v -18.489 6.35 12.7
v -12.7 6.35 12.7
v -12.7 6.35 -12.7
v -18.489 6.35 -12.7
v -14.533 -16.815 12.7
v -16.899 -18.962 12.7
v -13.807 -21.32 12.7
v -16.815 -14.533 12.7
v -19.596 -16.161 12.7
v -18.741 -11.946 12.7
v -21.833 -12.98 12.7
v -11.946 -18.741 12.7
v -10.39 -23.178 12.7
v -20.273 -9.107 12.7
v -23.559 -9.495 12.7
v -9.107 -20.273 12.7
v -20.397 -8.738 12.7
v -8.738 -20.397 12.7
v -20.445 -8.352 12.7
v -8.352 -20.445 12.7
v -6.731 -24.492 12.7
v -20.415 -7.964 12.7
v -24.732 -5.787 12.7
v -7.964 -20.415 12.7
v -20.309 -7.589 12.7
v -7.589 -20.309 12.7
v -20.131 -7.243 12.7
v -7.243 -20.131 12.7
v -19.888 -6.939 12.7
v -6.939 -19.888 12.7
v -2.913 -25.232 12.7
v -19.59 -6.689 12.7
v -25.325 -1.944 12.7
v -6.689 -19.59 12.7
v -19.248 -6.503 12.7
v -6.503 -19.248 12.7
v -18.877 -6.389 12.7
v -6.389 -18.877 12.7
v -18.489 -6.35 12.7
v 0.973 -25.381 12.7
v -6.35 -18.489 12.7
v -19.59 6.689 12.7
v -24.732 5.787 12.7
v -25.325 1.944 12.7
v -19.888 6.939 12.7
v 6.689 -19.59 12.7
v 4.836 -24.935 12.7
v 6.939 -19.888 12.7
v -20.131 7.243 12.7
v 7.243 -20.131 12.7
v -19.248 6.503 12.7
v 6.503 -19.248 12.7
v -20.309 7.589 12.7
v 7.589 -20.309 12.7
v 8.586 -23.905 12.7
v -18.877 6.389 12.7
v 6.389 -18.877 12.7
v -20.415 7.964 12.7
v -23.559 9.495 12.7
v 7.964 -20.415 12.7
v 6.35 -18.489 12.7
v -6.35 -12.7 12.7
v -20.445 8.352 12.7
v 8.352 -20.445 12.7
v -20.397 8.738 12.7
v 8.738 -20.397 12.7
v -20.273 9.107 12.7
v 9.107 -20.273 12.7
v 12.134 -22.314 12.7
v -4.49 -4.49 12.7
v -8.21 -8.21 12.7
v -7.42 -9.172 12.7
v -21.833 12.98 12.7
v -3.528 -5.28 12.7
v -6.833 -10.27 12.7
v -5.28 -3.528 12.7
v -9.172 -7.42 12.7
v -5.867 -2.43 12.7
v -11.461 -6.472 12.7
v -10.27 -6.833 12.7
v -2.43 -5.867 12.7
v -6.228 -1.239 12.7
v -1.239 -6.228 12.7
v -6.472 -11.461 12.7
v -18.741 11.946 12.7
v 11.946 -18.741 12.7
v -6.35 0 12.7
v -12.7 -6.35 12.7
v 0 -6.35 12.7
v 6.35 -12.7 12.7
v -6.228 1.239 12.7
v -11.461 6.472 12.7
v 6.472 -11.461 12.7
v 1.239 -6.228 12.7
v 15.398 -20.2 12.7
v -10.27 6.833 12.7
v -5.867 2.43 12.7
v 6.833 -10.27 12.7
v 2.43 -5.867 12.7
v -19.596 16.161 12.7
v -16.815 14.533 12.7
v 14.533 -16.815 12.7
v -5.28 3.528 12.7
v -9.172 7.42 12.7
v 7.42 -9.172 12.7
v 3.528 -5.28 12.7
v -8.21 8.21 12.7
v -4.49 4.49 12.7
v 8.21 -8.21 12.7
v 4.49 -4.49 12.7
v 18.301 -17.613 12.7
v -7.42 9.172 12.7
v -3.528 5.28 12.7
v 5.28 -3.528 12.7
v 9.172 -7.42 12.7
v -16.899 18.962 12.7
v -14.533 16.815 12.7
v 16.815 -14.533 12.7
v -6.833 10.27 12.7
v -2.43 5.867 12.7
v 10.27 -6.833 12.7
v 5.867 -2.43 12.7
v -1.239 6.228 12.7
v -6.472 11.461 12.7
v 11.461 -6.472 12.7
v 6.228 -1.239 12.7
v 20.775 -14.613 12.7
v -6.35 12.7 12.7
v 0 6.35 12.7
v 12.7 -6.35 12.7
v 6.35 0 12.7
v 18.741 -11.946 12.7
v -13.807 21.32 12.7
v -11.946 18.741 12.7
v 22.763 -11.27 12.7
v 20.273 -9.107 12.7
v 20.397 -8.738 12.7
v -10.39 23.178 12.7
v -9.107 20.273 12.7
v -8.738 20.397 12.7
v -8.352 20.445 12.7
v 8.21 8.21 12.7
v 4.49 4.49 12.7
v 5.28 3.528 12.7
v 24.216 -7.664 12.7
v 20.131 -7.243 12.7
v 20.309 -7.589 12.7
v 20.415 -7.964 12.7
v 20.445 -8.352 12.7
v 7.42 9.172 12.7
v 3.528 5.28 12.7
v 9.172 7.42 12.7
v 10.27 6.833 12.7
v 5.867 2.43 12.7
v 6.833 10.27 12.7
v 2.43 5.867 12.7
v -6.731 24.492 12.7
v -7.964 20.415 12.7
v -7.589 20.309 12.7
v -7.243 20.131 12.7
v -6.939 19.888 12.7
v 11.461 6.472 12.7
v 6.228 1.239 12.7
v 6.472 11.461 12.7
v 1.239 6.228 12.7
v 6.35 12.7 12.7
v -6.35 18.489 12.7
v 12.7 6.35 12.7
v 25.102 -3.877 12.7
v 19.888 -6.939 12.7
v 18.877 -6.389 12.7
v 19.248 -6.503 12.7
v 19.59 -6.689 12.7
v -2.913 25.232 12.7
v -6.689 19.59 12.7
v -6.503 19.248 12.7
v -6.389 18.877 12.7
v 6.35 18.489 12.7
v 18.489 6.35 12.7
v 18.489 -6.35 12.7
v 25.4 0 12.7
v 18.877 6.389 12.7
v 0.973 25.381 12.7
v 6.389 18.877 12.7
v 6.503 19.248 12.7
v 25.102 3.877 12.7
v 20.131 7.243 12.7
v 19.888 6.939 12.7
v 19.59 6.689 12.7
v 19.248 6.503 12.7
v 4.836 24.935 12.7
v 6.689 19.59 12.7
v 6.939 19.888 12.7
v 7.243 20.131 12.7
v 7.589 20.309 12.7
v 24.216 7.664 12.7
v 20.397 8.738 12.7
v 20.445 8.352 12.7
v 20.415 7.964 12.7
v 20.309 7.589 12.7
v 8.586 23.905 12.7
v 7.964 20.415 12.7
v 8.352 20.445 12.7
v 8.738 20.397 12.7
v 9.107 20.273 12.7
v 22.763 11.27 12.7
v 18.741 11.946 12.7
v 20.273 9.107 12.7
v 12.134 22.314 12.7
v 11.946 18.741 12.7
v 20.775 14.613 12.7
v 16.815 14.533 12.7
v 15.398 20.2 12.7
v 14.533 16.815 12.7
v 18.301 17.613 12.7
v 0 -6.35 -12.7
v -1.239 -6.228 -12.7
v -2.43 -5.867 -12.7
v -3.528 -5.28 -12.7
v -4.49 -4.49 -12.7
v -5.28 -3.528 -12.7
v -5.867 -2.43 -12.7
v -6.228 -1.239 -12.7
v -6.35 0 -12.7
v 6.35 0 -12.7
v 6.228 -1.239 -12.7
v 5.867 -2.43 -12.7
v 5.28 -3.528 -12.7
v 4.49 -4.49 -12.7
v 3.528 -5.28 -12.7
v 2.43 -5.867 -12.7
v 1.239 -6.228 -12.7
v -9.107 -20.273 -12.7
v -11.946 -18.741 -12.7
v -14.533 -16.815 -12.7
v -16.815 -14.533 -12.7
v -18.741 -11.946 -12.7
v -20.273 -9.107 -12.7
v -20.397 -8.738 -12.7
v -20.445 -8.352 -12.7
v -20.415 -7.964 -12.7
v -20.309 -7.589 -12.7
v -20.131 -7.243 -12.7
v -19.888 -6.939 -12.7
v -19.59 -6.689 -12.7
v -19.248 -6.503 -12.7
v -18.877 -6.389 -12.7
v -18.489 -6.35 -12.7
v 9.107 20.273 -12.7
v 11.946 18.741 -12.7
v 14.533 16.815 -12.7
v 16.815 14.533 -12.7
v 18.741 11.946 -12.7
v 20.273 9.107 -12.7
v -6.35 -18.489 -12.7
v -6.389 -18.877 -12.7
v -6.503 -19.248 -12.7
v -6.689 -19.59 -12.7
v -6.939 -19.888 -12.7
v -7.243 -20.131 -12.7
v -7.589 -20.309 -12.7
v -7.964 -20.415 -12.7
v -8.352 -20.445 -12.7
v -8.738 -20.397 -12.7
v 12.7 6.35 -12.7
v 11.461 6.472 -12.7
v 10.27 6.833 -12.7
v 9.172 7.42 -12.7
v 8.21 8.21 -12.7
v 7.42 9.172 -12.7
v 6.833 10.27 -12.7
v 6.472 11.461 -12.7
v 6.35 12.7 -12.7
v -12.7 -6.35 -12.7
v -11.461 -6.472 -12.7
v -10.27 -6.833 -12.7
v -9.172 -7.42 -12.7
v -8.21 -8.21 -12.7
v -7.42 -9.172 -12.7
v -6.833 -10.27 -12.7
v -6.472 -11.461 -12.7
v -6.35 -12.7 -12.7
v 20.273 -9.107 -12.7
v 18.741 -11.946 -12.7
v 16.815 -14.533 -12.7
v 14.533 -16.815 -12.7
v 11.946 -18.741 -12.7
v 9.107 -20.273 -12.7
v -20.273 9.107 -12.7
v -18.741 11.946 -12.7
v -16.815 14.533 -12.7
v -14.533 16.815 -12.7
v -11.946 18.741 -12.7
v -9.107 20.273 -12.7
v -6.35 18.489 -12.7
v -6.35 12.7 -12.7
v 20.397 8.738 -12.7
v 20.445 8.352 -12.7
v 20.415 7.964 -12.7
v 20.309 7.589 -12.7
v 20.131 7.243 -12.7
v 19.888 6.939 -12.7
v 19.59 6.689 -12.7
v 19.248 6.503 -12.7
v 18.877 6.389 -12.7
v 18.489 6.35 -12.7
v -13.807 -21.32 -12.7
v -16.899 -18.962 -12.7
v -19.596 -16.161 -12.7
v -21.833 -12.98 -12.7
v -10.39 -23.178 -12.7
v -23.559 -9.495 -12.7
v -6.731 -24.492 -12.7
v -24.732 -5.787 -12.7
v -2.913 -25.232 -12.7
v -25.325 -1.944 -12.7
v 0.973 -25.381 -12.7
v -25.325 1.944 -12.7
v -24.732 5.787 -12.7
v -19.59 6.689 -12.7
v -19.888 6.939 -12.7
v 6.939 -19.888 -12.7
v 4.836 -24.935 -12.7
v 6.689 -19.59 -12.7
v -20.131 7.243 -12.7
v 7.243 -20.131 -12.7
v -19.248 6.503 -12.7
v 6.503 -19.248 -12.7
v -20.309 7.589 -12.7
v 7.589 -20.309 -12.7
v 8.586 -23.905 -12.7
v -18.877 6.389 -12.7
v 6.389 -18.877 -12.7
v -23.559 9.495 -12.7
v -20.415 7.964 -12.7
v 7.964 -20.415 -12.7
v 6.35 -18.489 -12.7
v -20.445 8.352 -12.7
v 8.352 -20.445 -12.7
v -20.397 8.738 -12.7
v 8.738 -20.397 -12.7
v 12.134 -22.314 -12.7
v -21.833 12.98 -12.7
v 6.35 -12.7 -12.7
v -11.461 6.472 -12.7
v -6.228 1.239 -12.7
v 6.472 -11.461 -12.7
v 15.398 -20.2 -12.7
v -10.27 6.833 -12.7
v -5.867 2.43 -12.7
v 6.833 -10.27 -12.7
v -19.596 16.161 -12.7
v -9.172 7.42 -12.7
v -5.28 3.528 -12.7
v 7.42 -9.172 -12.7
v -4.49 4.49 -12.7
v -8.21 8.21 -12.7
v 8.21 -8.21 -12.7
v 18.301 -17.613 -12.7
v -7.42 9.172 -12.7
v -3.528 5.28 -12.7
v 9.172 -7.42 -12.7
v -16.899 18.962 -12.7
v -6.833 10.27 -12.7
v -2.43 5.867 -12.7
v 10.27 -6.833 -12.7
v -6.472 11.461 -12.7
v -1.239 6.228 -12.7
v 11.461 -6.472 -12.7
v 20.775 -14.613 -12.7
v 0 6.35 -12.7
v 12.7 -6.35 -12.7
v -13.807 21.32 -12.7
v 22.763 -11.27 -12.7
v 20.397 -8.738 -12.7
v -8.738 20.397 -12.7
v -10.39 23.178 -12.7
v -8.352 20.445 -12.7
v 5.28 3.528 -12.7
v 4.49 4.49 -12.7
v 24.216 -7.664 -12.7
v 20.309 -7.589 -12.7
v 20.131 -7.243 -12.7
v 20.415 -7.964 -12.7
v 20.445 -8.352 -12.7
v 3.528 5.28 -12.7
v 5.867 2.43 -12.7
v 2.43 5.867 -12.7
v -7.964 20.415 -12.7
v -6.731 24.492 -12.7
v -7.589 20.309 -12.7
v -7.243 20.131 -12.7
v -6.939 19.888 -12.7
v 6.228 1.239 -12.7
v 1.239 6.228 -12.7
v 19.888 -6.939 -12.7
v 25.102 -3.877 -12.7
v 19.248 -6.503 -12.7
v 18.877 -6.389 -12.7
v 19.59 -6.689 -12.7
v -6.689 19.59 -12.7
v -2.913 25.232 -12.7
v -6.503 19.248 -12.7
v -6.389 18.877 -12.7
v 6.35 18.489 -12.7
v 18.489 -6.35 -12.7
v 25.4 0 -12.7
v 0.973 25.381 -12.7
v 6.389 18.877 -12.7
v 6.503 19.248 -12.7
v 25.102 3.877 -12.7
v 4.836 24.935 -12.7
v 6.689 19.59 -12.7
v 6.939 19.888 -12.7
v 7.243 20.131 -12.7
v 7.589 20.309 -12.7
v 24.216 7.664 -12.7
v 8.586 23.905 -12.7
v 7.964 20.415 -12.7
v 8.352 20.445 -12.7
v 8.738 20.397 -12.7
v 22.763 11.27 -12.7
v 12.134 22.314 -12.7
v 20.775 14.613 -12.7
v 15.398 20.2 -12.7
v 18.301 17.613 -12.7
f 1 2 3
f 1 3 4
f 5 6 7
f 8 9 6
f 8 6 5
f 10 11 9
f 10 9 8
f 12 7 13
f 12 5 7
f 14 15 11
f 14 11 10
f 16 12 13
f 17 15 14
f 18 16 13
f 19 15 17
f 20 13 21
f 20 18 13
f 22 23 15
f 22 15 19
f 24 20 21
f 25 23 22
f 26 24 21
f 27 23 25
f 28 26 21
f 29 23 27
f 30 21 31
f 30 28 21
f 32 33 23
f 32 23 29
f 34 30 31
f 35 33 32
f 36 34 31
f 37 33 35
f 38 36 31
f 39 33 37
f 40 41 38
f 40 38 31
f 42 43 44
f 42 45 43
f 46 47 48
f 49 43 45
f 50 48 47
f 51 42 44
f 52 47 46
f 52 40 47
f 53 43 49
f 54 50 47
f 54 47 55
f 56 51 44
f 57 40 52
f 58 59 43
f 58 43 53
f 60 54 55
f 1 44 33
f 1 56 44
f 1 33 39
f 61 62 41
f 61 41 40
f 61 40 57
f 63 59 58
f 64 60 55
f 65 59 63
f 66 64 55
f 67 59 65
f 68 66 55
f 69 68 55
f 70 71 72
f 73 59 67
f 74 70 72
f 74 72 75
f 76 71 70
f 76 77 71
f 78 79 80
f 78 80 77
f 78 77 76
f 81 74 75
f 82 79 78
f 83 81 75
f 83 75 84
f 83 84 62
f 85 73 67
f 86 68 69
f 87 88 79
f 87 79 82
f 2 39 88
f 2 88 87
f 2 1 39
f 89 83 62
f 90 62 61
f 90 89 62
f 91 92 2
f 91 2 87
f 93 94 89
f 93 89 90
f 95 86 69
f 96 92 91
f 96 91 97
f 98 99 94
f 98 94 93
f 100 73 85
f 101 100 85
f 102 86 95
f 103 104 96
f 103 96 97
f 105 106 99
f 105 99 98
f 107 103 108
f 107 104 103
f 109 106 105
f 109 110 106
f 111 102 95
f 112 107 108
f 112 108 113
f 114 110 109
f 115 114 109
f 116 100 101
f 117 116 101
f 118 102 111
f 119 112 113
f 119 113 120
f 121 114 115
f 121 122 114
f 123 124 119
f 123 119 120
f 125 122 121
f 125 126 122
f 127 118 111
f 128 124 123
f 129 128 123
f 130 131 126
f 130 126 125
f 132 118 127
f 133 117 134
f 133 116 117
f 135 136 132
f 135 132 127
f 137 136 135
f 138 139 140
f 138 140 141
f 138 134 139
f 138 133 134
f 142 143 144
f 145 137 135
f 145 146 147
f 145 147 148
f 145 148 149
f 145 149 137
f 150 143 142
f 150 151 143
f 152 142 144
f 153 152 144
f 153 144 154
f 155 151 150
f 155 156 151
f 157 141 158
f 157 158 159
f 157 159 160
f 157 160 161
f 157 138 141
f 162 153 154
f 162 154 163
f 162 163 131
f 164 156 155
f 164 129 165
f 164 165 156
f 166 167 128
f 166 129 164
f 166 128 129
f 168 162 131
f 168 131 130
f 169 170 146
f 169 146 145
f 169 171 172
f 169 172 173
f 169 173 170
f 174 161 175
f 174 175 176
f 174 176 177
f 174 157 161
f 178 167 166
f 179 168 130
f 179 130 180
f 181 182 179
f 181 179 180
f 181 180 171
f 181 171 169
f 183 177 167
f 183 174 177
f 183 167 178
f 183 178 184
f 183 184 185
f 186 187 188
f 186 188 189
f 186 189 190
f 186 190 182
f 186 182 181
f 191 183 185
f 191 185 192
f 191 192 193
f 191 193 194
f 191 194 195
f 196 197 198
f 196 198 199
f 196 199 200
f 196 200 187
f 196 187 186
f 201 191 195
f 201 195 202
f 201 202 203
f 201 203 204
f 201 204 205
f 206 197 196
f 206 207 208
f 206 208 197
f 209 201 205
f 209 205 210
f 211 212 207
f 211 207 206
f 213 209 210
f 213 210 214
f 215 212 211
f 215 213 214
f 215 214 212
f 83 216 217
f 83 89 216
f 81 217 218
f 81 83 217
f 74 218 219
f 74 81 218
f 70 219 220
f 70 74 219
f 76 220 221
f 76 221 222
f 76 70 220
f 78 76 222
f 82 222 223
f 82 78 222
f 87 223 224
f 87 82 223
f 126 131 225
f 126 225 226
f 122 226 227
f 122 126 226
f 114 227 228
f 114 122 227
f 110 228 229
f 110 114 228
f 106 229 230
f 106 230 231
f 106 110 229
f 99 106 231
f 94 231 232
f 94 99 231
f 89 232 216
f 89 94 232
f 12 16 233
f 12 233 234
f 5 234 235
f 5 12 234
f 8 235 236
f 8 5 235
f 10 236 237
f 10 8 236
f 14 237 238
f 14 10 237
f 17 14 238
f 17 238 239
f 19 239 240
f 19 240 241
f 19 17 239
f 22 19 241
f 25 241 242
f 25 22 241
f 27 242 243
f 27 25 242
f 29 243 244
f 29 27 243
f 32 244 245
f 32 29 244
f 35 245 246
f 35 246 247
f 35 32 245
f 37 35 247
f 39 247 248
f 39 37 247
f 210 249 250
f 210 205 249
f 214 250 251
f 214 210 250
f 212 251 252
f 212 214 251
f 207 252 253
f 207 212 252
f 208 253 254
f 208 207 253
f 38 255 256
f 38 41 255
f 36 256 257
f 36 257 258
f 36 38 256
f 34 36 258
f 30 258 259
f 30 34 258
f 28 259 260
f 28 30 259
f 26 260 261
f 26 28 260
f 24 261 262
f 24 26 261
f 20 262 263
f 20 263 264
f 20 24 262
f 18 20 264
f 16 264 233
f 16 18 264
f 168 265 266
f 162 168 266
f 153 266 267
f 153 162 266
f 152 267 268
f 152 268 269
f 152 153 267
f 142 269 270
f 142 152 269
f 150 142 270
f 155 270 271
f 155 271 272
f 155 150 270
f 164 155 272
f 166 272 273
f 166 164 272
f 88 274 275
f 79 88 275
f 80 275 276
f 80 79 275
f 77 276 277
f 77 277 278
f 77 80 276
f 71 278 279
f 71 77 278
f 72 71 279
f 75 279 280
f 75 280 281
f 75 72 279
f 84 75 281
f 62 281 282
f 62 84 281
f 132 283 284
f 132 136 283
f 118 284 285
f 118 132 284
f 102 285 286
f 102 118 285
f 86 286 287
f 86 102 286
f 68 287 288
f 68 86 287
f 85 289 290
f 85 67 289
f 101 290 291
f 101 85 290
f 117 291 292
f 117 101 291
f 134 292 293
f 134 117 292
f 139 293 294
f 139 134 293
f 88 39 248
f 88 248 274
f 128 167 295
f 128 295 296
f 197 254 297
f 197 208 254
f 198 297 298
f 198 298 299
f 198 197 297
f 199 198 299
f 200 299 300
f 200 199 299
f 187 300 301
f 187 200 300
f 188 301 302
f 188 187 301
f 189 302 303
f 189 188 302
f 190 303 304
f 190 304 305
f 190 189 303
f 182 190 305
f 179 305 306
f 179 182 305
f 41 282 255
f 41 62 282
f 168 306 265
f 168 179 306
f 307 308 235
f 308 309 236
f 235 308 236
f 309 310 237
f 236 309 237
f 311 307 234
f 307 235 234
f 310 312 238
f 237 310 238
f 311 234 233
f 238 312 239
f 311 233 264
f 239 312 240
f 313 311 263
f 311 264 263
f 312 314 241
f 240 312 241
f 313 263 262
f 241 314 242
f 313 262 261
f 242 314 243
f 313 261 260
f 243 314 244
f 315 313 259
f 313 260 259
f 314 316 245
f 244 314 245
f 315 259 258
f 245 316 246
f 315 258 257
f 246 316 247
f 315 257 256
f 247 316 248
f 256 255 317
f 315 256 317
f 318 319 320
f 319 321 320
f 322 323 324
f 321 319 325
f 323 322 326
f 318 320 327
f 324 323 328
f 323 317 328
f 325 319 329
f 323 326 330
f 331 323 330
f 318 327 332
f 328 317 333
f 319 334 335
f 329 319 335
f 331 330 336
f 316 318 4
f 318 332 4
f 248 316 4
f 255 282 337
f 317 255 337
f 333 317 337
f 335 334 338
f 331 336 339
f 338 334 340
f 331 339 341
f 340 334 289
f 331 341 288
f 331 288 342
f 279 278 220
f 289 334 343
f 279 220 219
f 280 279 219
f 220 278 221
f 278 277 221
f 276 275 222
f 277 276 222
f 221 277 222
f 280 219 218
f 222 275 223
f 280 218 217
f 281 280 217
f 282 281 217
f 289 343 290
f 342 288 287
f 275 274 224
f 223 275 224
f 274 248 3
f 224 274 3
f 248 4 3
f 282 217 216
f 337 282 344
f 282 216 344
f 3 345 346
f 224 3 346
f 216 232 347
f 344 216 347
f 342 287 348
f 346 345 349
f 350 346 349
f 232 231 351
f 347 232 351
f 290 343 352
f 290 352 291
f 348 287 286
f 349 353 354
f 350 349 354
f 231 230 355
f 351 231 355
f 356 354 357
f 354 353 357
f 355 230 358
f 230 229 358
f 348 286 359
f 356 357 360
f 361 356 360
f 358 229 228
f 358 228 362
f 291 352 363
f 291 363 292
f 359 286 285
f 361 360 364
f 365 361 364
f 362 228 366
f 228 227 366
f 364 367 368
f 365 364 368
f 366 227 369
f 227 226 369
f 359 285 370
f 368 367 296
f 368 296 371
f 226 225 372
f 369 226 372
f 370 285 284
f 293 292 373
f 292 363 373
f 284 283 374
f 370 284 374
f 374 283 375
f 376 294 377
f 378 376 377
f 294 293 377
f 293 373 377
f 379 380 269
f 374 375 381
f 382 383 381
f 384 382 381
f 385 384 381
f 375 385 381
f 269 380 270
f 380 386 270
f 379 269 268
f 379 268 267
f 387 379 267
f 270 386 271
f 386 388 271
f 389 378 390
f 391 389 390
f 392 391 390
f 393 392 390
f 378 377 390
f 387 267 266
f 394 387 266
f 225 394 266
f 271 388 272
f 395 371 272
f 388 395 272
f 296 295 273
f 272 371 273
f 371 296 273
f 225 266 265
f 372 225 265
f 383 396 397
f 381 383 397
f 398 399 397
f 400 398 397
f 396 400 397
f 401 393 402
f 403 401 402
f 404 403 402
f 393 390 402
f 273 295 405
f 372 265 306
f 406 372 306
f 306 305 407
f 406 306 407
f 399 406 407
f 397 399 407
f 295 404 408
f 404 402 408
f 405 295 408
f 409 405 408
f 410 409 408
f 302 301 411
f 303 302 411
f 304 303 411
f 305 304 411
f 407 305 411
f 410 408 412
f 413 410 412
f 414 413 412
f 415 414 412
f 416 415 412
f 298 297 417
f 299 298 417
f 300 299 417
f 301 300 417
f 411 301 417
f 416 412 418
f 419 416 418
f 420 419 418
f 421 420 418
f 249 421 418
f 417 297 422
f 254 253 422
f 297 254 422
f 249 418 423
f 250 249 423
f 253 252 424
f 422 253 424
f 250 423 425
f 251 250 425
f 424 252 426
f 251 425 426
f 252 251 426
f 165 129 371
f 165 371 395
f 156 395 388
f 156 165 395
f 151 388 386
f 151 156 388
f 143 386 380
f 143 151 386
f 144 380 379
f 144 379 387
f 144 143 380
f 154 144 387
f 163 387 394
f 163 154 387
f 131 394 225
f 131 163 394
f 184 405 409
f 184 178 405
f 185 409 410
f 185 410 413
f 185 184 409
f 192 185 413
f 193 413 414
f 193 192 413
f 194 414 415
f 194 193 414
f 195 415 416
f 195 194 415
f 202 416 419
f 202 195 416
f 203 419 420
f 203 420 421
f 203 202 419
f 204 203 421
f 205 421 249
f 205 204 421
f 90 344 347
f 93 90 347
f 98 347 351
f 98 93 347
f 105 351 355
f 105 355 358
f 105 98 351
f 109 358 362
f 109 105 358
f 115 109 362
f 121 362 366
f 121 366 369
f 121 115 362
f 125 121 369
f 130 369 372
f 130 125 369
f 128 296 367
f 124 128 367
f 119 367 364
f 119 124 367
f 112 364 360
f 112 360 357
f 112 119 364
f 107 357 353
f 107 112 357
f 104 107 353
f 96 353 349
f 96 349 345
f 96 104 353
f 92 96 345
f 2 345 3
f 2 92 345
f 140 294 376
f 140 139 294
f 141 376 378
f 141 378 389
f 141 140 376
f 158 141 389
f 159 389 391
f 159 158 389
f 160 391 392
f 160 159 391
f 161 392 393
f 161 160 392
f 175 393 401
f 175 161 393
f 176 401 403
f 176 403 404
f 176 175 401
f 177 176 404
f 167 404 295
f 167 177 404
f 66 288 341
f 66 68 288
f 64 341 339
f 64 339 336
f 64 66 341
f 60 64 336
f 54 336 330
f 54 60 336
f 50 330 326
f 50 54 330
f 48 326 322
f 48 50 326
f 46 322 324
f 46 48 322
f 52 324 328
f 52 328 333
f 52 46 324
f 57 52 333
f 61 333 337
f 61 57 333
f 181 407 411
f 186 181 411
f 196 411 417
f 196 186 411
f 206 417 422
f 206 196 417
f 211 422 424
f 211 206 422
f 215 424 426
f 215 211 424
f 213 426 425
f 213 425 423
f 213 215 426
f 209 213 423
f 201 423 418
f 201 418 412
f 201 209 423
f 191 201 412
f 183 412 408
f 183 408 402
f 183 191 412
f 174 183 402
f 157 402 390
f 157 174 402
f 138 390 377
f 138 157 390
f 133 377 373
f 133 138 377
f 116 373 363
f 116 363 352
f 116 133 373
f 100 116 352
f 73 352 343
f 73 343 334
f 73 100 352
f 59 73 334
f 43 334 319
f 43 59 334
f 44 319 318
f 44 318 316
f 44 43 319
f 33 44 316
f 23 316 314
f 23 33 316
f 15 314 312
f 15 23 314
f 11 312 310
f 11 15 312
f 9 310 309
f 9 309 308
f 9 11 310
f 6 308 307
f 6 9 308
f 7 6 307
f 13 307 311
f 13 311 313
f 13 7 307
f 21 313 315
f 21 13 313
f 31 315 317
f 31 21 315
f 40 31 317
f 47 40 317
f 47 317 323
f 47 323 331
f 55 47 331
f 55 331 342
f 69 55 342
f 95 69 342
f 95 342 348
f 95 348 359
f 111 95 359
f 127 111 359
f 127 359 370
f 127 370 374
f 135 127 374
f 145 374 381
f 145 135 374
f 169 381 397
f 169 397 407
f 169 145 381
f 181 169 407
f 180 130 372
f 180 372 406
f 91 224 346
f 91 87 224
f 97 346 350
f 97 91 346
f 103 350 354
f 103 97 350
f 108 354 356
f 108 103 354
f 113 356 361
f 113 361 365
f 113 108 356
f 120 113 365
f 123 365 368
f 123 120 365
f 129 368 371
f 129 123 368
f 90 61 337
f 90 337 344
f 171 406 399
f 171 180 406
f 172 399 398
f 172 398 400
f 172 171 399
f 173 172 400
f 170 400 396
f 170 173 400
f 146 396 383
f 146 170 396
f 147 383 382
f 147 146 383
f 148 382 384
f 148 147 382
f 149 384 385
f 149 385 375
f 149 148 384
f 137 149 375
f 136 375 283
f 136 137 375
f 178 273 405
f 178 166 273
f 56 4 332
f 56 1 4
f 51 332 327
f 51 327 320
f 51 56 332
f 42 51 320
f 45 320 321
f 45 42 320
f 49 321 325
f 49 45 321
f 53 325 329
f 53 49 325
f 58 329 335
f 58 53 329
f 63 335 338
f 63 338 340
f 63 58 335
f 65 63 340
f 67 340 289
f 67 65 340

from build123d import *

# Parameters (mm, degrees)
F0_R     = 25.4
F1_DEPTH = 12.7


with BuildPart() as f1:
    # F0 (on Top) → F1 (new body, symmetric)
    with BuildSketch(Plane.XY):
        Circle(F0_R)
        with BuildLine():
            ThreePointArc((-9.107237, -20.273353), (-15.715448, -15.715448), (-20.273353, -9.107237))
            ThreePointArc((-20.273353, -9.107237), (-20.13134, -7.243326), (-18.489298, -6.35))
            Line((-18.489298, -6.35), (-12.7, -6.35))
            ThreePointArc((-12.7, -6.35), (-8.209872, -8.209872), (-6.35, -12.7))
            Line((-6.35, -12.7), (-6.35, -18.489298))
            ThreePointArc((-6.35, -18.489298), (-7.243326, -20.13134), (-9.107237, -20.273353))
        make_face(mode=Mode.SUBTRACT)
        with BuildLine():
            ThreePointArc((0, 6.35), (4.490128, 4.490128), (6.35, 0))
            ThreePointArc((6.35, 0), (4.490128, -4.490128), (0, -6.35))
            ThreePointArc((0, -6.35), (-4.490128, -4.490128), (-6.35, 0))
            ThreePointArc((-6.35, 0), (-4.490128, 4.490128), (0, 6.35))
        make_face(mode=Mode.SUBTRACT)
        with BuildLine():
            Line((6.35, -18.489298), (6.35, -12.7))
            ThreePointArc((6.35, -12.7), (8.209872, -8.209872), (12.7, -6.35))
            Line((12.7, -6.35), (18.489298, -6.35))
            ThreePointArc((18.489298, -6.35), (20.13134, -7.243326), (20.273353, -9.107237))
            ThreePointArc((20.273353, -9.107237), (15.715448, -15.715448), (9.107237, -20.273353))
            ThreePointArc((9.107237, -20.273353), (7.243326, -20.13134), (6.35, -18.489298))
        make_face(mode=Mode.SUBTRACT)
        with BuildLine():
            Line((-6.35, 18.489298), (-6.35, 12.7))
            ThreePointArc((-6.35, 12.7), (-8.209872, 8.209872), (-12.7, 6.35))
            Line((-12.7, 6.35), (-18.489298, 6.35))
            ThreePointArc((-18.489298, 6.35), (-20.13134, 7.243326), (-20.273353, 9.107237))
            ThreePointArc((-20.273353, 9.107237), (-15.715448, 15.715448), (-9.107237, 20.273353))
            ThreePointArc((-9.107237, 20.273353), (-7.243326, 20.13134), (-6.35, 18.489298))
        make_face(mode=Mode.SUBTRACT)
        with BuildLine():
            ThreePointArc((12.7, 6.35), (8.209872, 8.209872), (6.35, 12.7))
            Line((6.35, 12.7), (6.35, 18.489298))
            ThreePointArc((6.35, 18.489298), (7.243326, 20.13134), (9.107237, 20.273353))
            ThreePointArc((9.107237, 20.273353), (15.715448, 15.715448), (20.273353, 9.107237))
            ThreePointArc((20.273353, 9.107237), (20.13134, 7.243326), (18.489298, 6.35))
            Line((18.489298, 6.35), (12.7, 6.35))
        make_face(mode=Mode.SUBTRACT)
    extrude(amount=F1_DEPTH, both=True)


solid = f1.part
